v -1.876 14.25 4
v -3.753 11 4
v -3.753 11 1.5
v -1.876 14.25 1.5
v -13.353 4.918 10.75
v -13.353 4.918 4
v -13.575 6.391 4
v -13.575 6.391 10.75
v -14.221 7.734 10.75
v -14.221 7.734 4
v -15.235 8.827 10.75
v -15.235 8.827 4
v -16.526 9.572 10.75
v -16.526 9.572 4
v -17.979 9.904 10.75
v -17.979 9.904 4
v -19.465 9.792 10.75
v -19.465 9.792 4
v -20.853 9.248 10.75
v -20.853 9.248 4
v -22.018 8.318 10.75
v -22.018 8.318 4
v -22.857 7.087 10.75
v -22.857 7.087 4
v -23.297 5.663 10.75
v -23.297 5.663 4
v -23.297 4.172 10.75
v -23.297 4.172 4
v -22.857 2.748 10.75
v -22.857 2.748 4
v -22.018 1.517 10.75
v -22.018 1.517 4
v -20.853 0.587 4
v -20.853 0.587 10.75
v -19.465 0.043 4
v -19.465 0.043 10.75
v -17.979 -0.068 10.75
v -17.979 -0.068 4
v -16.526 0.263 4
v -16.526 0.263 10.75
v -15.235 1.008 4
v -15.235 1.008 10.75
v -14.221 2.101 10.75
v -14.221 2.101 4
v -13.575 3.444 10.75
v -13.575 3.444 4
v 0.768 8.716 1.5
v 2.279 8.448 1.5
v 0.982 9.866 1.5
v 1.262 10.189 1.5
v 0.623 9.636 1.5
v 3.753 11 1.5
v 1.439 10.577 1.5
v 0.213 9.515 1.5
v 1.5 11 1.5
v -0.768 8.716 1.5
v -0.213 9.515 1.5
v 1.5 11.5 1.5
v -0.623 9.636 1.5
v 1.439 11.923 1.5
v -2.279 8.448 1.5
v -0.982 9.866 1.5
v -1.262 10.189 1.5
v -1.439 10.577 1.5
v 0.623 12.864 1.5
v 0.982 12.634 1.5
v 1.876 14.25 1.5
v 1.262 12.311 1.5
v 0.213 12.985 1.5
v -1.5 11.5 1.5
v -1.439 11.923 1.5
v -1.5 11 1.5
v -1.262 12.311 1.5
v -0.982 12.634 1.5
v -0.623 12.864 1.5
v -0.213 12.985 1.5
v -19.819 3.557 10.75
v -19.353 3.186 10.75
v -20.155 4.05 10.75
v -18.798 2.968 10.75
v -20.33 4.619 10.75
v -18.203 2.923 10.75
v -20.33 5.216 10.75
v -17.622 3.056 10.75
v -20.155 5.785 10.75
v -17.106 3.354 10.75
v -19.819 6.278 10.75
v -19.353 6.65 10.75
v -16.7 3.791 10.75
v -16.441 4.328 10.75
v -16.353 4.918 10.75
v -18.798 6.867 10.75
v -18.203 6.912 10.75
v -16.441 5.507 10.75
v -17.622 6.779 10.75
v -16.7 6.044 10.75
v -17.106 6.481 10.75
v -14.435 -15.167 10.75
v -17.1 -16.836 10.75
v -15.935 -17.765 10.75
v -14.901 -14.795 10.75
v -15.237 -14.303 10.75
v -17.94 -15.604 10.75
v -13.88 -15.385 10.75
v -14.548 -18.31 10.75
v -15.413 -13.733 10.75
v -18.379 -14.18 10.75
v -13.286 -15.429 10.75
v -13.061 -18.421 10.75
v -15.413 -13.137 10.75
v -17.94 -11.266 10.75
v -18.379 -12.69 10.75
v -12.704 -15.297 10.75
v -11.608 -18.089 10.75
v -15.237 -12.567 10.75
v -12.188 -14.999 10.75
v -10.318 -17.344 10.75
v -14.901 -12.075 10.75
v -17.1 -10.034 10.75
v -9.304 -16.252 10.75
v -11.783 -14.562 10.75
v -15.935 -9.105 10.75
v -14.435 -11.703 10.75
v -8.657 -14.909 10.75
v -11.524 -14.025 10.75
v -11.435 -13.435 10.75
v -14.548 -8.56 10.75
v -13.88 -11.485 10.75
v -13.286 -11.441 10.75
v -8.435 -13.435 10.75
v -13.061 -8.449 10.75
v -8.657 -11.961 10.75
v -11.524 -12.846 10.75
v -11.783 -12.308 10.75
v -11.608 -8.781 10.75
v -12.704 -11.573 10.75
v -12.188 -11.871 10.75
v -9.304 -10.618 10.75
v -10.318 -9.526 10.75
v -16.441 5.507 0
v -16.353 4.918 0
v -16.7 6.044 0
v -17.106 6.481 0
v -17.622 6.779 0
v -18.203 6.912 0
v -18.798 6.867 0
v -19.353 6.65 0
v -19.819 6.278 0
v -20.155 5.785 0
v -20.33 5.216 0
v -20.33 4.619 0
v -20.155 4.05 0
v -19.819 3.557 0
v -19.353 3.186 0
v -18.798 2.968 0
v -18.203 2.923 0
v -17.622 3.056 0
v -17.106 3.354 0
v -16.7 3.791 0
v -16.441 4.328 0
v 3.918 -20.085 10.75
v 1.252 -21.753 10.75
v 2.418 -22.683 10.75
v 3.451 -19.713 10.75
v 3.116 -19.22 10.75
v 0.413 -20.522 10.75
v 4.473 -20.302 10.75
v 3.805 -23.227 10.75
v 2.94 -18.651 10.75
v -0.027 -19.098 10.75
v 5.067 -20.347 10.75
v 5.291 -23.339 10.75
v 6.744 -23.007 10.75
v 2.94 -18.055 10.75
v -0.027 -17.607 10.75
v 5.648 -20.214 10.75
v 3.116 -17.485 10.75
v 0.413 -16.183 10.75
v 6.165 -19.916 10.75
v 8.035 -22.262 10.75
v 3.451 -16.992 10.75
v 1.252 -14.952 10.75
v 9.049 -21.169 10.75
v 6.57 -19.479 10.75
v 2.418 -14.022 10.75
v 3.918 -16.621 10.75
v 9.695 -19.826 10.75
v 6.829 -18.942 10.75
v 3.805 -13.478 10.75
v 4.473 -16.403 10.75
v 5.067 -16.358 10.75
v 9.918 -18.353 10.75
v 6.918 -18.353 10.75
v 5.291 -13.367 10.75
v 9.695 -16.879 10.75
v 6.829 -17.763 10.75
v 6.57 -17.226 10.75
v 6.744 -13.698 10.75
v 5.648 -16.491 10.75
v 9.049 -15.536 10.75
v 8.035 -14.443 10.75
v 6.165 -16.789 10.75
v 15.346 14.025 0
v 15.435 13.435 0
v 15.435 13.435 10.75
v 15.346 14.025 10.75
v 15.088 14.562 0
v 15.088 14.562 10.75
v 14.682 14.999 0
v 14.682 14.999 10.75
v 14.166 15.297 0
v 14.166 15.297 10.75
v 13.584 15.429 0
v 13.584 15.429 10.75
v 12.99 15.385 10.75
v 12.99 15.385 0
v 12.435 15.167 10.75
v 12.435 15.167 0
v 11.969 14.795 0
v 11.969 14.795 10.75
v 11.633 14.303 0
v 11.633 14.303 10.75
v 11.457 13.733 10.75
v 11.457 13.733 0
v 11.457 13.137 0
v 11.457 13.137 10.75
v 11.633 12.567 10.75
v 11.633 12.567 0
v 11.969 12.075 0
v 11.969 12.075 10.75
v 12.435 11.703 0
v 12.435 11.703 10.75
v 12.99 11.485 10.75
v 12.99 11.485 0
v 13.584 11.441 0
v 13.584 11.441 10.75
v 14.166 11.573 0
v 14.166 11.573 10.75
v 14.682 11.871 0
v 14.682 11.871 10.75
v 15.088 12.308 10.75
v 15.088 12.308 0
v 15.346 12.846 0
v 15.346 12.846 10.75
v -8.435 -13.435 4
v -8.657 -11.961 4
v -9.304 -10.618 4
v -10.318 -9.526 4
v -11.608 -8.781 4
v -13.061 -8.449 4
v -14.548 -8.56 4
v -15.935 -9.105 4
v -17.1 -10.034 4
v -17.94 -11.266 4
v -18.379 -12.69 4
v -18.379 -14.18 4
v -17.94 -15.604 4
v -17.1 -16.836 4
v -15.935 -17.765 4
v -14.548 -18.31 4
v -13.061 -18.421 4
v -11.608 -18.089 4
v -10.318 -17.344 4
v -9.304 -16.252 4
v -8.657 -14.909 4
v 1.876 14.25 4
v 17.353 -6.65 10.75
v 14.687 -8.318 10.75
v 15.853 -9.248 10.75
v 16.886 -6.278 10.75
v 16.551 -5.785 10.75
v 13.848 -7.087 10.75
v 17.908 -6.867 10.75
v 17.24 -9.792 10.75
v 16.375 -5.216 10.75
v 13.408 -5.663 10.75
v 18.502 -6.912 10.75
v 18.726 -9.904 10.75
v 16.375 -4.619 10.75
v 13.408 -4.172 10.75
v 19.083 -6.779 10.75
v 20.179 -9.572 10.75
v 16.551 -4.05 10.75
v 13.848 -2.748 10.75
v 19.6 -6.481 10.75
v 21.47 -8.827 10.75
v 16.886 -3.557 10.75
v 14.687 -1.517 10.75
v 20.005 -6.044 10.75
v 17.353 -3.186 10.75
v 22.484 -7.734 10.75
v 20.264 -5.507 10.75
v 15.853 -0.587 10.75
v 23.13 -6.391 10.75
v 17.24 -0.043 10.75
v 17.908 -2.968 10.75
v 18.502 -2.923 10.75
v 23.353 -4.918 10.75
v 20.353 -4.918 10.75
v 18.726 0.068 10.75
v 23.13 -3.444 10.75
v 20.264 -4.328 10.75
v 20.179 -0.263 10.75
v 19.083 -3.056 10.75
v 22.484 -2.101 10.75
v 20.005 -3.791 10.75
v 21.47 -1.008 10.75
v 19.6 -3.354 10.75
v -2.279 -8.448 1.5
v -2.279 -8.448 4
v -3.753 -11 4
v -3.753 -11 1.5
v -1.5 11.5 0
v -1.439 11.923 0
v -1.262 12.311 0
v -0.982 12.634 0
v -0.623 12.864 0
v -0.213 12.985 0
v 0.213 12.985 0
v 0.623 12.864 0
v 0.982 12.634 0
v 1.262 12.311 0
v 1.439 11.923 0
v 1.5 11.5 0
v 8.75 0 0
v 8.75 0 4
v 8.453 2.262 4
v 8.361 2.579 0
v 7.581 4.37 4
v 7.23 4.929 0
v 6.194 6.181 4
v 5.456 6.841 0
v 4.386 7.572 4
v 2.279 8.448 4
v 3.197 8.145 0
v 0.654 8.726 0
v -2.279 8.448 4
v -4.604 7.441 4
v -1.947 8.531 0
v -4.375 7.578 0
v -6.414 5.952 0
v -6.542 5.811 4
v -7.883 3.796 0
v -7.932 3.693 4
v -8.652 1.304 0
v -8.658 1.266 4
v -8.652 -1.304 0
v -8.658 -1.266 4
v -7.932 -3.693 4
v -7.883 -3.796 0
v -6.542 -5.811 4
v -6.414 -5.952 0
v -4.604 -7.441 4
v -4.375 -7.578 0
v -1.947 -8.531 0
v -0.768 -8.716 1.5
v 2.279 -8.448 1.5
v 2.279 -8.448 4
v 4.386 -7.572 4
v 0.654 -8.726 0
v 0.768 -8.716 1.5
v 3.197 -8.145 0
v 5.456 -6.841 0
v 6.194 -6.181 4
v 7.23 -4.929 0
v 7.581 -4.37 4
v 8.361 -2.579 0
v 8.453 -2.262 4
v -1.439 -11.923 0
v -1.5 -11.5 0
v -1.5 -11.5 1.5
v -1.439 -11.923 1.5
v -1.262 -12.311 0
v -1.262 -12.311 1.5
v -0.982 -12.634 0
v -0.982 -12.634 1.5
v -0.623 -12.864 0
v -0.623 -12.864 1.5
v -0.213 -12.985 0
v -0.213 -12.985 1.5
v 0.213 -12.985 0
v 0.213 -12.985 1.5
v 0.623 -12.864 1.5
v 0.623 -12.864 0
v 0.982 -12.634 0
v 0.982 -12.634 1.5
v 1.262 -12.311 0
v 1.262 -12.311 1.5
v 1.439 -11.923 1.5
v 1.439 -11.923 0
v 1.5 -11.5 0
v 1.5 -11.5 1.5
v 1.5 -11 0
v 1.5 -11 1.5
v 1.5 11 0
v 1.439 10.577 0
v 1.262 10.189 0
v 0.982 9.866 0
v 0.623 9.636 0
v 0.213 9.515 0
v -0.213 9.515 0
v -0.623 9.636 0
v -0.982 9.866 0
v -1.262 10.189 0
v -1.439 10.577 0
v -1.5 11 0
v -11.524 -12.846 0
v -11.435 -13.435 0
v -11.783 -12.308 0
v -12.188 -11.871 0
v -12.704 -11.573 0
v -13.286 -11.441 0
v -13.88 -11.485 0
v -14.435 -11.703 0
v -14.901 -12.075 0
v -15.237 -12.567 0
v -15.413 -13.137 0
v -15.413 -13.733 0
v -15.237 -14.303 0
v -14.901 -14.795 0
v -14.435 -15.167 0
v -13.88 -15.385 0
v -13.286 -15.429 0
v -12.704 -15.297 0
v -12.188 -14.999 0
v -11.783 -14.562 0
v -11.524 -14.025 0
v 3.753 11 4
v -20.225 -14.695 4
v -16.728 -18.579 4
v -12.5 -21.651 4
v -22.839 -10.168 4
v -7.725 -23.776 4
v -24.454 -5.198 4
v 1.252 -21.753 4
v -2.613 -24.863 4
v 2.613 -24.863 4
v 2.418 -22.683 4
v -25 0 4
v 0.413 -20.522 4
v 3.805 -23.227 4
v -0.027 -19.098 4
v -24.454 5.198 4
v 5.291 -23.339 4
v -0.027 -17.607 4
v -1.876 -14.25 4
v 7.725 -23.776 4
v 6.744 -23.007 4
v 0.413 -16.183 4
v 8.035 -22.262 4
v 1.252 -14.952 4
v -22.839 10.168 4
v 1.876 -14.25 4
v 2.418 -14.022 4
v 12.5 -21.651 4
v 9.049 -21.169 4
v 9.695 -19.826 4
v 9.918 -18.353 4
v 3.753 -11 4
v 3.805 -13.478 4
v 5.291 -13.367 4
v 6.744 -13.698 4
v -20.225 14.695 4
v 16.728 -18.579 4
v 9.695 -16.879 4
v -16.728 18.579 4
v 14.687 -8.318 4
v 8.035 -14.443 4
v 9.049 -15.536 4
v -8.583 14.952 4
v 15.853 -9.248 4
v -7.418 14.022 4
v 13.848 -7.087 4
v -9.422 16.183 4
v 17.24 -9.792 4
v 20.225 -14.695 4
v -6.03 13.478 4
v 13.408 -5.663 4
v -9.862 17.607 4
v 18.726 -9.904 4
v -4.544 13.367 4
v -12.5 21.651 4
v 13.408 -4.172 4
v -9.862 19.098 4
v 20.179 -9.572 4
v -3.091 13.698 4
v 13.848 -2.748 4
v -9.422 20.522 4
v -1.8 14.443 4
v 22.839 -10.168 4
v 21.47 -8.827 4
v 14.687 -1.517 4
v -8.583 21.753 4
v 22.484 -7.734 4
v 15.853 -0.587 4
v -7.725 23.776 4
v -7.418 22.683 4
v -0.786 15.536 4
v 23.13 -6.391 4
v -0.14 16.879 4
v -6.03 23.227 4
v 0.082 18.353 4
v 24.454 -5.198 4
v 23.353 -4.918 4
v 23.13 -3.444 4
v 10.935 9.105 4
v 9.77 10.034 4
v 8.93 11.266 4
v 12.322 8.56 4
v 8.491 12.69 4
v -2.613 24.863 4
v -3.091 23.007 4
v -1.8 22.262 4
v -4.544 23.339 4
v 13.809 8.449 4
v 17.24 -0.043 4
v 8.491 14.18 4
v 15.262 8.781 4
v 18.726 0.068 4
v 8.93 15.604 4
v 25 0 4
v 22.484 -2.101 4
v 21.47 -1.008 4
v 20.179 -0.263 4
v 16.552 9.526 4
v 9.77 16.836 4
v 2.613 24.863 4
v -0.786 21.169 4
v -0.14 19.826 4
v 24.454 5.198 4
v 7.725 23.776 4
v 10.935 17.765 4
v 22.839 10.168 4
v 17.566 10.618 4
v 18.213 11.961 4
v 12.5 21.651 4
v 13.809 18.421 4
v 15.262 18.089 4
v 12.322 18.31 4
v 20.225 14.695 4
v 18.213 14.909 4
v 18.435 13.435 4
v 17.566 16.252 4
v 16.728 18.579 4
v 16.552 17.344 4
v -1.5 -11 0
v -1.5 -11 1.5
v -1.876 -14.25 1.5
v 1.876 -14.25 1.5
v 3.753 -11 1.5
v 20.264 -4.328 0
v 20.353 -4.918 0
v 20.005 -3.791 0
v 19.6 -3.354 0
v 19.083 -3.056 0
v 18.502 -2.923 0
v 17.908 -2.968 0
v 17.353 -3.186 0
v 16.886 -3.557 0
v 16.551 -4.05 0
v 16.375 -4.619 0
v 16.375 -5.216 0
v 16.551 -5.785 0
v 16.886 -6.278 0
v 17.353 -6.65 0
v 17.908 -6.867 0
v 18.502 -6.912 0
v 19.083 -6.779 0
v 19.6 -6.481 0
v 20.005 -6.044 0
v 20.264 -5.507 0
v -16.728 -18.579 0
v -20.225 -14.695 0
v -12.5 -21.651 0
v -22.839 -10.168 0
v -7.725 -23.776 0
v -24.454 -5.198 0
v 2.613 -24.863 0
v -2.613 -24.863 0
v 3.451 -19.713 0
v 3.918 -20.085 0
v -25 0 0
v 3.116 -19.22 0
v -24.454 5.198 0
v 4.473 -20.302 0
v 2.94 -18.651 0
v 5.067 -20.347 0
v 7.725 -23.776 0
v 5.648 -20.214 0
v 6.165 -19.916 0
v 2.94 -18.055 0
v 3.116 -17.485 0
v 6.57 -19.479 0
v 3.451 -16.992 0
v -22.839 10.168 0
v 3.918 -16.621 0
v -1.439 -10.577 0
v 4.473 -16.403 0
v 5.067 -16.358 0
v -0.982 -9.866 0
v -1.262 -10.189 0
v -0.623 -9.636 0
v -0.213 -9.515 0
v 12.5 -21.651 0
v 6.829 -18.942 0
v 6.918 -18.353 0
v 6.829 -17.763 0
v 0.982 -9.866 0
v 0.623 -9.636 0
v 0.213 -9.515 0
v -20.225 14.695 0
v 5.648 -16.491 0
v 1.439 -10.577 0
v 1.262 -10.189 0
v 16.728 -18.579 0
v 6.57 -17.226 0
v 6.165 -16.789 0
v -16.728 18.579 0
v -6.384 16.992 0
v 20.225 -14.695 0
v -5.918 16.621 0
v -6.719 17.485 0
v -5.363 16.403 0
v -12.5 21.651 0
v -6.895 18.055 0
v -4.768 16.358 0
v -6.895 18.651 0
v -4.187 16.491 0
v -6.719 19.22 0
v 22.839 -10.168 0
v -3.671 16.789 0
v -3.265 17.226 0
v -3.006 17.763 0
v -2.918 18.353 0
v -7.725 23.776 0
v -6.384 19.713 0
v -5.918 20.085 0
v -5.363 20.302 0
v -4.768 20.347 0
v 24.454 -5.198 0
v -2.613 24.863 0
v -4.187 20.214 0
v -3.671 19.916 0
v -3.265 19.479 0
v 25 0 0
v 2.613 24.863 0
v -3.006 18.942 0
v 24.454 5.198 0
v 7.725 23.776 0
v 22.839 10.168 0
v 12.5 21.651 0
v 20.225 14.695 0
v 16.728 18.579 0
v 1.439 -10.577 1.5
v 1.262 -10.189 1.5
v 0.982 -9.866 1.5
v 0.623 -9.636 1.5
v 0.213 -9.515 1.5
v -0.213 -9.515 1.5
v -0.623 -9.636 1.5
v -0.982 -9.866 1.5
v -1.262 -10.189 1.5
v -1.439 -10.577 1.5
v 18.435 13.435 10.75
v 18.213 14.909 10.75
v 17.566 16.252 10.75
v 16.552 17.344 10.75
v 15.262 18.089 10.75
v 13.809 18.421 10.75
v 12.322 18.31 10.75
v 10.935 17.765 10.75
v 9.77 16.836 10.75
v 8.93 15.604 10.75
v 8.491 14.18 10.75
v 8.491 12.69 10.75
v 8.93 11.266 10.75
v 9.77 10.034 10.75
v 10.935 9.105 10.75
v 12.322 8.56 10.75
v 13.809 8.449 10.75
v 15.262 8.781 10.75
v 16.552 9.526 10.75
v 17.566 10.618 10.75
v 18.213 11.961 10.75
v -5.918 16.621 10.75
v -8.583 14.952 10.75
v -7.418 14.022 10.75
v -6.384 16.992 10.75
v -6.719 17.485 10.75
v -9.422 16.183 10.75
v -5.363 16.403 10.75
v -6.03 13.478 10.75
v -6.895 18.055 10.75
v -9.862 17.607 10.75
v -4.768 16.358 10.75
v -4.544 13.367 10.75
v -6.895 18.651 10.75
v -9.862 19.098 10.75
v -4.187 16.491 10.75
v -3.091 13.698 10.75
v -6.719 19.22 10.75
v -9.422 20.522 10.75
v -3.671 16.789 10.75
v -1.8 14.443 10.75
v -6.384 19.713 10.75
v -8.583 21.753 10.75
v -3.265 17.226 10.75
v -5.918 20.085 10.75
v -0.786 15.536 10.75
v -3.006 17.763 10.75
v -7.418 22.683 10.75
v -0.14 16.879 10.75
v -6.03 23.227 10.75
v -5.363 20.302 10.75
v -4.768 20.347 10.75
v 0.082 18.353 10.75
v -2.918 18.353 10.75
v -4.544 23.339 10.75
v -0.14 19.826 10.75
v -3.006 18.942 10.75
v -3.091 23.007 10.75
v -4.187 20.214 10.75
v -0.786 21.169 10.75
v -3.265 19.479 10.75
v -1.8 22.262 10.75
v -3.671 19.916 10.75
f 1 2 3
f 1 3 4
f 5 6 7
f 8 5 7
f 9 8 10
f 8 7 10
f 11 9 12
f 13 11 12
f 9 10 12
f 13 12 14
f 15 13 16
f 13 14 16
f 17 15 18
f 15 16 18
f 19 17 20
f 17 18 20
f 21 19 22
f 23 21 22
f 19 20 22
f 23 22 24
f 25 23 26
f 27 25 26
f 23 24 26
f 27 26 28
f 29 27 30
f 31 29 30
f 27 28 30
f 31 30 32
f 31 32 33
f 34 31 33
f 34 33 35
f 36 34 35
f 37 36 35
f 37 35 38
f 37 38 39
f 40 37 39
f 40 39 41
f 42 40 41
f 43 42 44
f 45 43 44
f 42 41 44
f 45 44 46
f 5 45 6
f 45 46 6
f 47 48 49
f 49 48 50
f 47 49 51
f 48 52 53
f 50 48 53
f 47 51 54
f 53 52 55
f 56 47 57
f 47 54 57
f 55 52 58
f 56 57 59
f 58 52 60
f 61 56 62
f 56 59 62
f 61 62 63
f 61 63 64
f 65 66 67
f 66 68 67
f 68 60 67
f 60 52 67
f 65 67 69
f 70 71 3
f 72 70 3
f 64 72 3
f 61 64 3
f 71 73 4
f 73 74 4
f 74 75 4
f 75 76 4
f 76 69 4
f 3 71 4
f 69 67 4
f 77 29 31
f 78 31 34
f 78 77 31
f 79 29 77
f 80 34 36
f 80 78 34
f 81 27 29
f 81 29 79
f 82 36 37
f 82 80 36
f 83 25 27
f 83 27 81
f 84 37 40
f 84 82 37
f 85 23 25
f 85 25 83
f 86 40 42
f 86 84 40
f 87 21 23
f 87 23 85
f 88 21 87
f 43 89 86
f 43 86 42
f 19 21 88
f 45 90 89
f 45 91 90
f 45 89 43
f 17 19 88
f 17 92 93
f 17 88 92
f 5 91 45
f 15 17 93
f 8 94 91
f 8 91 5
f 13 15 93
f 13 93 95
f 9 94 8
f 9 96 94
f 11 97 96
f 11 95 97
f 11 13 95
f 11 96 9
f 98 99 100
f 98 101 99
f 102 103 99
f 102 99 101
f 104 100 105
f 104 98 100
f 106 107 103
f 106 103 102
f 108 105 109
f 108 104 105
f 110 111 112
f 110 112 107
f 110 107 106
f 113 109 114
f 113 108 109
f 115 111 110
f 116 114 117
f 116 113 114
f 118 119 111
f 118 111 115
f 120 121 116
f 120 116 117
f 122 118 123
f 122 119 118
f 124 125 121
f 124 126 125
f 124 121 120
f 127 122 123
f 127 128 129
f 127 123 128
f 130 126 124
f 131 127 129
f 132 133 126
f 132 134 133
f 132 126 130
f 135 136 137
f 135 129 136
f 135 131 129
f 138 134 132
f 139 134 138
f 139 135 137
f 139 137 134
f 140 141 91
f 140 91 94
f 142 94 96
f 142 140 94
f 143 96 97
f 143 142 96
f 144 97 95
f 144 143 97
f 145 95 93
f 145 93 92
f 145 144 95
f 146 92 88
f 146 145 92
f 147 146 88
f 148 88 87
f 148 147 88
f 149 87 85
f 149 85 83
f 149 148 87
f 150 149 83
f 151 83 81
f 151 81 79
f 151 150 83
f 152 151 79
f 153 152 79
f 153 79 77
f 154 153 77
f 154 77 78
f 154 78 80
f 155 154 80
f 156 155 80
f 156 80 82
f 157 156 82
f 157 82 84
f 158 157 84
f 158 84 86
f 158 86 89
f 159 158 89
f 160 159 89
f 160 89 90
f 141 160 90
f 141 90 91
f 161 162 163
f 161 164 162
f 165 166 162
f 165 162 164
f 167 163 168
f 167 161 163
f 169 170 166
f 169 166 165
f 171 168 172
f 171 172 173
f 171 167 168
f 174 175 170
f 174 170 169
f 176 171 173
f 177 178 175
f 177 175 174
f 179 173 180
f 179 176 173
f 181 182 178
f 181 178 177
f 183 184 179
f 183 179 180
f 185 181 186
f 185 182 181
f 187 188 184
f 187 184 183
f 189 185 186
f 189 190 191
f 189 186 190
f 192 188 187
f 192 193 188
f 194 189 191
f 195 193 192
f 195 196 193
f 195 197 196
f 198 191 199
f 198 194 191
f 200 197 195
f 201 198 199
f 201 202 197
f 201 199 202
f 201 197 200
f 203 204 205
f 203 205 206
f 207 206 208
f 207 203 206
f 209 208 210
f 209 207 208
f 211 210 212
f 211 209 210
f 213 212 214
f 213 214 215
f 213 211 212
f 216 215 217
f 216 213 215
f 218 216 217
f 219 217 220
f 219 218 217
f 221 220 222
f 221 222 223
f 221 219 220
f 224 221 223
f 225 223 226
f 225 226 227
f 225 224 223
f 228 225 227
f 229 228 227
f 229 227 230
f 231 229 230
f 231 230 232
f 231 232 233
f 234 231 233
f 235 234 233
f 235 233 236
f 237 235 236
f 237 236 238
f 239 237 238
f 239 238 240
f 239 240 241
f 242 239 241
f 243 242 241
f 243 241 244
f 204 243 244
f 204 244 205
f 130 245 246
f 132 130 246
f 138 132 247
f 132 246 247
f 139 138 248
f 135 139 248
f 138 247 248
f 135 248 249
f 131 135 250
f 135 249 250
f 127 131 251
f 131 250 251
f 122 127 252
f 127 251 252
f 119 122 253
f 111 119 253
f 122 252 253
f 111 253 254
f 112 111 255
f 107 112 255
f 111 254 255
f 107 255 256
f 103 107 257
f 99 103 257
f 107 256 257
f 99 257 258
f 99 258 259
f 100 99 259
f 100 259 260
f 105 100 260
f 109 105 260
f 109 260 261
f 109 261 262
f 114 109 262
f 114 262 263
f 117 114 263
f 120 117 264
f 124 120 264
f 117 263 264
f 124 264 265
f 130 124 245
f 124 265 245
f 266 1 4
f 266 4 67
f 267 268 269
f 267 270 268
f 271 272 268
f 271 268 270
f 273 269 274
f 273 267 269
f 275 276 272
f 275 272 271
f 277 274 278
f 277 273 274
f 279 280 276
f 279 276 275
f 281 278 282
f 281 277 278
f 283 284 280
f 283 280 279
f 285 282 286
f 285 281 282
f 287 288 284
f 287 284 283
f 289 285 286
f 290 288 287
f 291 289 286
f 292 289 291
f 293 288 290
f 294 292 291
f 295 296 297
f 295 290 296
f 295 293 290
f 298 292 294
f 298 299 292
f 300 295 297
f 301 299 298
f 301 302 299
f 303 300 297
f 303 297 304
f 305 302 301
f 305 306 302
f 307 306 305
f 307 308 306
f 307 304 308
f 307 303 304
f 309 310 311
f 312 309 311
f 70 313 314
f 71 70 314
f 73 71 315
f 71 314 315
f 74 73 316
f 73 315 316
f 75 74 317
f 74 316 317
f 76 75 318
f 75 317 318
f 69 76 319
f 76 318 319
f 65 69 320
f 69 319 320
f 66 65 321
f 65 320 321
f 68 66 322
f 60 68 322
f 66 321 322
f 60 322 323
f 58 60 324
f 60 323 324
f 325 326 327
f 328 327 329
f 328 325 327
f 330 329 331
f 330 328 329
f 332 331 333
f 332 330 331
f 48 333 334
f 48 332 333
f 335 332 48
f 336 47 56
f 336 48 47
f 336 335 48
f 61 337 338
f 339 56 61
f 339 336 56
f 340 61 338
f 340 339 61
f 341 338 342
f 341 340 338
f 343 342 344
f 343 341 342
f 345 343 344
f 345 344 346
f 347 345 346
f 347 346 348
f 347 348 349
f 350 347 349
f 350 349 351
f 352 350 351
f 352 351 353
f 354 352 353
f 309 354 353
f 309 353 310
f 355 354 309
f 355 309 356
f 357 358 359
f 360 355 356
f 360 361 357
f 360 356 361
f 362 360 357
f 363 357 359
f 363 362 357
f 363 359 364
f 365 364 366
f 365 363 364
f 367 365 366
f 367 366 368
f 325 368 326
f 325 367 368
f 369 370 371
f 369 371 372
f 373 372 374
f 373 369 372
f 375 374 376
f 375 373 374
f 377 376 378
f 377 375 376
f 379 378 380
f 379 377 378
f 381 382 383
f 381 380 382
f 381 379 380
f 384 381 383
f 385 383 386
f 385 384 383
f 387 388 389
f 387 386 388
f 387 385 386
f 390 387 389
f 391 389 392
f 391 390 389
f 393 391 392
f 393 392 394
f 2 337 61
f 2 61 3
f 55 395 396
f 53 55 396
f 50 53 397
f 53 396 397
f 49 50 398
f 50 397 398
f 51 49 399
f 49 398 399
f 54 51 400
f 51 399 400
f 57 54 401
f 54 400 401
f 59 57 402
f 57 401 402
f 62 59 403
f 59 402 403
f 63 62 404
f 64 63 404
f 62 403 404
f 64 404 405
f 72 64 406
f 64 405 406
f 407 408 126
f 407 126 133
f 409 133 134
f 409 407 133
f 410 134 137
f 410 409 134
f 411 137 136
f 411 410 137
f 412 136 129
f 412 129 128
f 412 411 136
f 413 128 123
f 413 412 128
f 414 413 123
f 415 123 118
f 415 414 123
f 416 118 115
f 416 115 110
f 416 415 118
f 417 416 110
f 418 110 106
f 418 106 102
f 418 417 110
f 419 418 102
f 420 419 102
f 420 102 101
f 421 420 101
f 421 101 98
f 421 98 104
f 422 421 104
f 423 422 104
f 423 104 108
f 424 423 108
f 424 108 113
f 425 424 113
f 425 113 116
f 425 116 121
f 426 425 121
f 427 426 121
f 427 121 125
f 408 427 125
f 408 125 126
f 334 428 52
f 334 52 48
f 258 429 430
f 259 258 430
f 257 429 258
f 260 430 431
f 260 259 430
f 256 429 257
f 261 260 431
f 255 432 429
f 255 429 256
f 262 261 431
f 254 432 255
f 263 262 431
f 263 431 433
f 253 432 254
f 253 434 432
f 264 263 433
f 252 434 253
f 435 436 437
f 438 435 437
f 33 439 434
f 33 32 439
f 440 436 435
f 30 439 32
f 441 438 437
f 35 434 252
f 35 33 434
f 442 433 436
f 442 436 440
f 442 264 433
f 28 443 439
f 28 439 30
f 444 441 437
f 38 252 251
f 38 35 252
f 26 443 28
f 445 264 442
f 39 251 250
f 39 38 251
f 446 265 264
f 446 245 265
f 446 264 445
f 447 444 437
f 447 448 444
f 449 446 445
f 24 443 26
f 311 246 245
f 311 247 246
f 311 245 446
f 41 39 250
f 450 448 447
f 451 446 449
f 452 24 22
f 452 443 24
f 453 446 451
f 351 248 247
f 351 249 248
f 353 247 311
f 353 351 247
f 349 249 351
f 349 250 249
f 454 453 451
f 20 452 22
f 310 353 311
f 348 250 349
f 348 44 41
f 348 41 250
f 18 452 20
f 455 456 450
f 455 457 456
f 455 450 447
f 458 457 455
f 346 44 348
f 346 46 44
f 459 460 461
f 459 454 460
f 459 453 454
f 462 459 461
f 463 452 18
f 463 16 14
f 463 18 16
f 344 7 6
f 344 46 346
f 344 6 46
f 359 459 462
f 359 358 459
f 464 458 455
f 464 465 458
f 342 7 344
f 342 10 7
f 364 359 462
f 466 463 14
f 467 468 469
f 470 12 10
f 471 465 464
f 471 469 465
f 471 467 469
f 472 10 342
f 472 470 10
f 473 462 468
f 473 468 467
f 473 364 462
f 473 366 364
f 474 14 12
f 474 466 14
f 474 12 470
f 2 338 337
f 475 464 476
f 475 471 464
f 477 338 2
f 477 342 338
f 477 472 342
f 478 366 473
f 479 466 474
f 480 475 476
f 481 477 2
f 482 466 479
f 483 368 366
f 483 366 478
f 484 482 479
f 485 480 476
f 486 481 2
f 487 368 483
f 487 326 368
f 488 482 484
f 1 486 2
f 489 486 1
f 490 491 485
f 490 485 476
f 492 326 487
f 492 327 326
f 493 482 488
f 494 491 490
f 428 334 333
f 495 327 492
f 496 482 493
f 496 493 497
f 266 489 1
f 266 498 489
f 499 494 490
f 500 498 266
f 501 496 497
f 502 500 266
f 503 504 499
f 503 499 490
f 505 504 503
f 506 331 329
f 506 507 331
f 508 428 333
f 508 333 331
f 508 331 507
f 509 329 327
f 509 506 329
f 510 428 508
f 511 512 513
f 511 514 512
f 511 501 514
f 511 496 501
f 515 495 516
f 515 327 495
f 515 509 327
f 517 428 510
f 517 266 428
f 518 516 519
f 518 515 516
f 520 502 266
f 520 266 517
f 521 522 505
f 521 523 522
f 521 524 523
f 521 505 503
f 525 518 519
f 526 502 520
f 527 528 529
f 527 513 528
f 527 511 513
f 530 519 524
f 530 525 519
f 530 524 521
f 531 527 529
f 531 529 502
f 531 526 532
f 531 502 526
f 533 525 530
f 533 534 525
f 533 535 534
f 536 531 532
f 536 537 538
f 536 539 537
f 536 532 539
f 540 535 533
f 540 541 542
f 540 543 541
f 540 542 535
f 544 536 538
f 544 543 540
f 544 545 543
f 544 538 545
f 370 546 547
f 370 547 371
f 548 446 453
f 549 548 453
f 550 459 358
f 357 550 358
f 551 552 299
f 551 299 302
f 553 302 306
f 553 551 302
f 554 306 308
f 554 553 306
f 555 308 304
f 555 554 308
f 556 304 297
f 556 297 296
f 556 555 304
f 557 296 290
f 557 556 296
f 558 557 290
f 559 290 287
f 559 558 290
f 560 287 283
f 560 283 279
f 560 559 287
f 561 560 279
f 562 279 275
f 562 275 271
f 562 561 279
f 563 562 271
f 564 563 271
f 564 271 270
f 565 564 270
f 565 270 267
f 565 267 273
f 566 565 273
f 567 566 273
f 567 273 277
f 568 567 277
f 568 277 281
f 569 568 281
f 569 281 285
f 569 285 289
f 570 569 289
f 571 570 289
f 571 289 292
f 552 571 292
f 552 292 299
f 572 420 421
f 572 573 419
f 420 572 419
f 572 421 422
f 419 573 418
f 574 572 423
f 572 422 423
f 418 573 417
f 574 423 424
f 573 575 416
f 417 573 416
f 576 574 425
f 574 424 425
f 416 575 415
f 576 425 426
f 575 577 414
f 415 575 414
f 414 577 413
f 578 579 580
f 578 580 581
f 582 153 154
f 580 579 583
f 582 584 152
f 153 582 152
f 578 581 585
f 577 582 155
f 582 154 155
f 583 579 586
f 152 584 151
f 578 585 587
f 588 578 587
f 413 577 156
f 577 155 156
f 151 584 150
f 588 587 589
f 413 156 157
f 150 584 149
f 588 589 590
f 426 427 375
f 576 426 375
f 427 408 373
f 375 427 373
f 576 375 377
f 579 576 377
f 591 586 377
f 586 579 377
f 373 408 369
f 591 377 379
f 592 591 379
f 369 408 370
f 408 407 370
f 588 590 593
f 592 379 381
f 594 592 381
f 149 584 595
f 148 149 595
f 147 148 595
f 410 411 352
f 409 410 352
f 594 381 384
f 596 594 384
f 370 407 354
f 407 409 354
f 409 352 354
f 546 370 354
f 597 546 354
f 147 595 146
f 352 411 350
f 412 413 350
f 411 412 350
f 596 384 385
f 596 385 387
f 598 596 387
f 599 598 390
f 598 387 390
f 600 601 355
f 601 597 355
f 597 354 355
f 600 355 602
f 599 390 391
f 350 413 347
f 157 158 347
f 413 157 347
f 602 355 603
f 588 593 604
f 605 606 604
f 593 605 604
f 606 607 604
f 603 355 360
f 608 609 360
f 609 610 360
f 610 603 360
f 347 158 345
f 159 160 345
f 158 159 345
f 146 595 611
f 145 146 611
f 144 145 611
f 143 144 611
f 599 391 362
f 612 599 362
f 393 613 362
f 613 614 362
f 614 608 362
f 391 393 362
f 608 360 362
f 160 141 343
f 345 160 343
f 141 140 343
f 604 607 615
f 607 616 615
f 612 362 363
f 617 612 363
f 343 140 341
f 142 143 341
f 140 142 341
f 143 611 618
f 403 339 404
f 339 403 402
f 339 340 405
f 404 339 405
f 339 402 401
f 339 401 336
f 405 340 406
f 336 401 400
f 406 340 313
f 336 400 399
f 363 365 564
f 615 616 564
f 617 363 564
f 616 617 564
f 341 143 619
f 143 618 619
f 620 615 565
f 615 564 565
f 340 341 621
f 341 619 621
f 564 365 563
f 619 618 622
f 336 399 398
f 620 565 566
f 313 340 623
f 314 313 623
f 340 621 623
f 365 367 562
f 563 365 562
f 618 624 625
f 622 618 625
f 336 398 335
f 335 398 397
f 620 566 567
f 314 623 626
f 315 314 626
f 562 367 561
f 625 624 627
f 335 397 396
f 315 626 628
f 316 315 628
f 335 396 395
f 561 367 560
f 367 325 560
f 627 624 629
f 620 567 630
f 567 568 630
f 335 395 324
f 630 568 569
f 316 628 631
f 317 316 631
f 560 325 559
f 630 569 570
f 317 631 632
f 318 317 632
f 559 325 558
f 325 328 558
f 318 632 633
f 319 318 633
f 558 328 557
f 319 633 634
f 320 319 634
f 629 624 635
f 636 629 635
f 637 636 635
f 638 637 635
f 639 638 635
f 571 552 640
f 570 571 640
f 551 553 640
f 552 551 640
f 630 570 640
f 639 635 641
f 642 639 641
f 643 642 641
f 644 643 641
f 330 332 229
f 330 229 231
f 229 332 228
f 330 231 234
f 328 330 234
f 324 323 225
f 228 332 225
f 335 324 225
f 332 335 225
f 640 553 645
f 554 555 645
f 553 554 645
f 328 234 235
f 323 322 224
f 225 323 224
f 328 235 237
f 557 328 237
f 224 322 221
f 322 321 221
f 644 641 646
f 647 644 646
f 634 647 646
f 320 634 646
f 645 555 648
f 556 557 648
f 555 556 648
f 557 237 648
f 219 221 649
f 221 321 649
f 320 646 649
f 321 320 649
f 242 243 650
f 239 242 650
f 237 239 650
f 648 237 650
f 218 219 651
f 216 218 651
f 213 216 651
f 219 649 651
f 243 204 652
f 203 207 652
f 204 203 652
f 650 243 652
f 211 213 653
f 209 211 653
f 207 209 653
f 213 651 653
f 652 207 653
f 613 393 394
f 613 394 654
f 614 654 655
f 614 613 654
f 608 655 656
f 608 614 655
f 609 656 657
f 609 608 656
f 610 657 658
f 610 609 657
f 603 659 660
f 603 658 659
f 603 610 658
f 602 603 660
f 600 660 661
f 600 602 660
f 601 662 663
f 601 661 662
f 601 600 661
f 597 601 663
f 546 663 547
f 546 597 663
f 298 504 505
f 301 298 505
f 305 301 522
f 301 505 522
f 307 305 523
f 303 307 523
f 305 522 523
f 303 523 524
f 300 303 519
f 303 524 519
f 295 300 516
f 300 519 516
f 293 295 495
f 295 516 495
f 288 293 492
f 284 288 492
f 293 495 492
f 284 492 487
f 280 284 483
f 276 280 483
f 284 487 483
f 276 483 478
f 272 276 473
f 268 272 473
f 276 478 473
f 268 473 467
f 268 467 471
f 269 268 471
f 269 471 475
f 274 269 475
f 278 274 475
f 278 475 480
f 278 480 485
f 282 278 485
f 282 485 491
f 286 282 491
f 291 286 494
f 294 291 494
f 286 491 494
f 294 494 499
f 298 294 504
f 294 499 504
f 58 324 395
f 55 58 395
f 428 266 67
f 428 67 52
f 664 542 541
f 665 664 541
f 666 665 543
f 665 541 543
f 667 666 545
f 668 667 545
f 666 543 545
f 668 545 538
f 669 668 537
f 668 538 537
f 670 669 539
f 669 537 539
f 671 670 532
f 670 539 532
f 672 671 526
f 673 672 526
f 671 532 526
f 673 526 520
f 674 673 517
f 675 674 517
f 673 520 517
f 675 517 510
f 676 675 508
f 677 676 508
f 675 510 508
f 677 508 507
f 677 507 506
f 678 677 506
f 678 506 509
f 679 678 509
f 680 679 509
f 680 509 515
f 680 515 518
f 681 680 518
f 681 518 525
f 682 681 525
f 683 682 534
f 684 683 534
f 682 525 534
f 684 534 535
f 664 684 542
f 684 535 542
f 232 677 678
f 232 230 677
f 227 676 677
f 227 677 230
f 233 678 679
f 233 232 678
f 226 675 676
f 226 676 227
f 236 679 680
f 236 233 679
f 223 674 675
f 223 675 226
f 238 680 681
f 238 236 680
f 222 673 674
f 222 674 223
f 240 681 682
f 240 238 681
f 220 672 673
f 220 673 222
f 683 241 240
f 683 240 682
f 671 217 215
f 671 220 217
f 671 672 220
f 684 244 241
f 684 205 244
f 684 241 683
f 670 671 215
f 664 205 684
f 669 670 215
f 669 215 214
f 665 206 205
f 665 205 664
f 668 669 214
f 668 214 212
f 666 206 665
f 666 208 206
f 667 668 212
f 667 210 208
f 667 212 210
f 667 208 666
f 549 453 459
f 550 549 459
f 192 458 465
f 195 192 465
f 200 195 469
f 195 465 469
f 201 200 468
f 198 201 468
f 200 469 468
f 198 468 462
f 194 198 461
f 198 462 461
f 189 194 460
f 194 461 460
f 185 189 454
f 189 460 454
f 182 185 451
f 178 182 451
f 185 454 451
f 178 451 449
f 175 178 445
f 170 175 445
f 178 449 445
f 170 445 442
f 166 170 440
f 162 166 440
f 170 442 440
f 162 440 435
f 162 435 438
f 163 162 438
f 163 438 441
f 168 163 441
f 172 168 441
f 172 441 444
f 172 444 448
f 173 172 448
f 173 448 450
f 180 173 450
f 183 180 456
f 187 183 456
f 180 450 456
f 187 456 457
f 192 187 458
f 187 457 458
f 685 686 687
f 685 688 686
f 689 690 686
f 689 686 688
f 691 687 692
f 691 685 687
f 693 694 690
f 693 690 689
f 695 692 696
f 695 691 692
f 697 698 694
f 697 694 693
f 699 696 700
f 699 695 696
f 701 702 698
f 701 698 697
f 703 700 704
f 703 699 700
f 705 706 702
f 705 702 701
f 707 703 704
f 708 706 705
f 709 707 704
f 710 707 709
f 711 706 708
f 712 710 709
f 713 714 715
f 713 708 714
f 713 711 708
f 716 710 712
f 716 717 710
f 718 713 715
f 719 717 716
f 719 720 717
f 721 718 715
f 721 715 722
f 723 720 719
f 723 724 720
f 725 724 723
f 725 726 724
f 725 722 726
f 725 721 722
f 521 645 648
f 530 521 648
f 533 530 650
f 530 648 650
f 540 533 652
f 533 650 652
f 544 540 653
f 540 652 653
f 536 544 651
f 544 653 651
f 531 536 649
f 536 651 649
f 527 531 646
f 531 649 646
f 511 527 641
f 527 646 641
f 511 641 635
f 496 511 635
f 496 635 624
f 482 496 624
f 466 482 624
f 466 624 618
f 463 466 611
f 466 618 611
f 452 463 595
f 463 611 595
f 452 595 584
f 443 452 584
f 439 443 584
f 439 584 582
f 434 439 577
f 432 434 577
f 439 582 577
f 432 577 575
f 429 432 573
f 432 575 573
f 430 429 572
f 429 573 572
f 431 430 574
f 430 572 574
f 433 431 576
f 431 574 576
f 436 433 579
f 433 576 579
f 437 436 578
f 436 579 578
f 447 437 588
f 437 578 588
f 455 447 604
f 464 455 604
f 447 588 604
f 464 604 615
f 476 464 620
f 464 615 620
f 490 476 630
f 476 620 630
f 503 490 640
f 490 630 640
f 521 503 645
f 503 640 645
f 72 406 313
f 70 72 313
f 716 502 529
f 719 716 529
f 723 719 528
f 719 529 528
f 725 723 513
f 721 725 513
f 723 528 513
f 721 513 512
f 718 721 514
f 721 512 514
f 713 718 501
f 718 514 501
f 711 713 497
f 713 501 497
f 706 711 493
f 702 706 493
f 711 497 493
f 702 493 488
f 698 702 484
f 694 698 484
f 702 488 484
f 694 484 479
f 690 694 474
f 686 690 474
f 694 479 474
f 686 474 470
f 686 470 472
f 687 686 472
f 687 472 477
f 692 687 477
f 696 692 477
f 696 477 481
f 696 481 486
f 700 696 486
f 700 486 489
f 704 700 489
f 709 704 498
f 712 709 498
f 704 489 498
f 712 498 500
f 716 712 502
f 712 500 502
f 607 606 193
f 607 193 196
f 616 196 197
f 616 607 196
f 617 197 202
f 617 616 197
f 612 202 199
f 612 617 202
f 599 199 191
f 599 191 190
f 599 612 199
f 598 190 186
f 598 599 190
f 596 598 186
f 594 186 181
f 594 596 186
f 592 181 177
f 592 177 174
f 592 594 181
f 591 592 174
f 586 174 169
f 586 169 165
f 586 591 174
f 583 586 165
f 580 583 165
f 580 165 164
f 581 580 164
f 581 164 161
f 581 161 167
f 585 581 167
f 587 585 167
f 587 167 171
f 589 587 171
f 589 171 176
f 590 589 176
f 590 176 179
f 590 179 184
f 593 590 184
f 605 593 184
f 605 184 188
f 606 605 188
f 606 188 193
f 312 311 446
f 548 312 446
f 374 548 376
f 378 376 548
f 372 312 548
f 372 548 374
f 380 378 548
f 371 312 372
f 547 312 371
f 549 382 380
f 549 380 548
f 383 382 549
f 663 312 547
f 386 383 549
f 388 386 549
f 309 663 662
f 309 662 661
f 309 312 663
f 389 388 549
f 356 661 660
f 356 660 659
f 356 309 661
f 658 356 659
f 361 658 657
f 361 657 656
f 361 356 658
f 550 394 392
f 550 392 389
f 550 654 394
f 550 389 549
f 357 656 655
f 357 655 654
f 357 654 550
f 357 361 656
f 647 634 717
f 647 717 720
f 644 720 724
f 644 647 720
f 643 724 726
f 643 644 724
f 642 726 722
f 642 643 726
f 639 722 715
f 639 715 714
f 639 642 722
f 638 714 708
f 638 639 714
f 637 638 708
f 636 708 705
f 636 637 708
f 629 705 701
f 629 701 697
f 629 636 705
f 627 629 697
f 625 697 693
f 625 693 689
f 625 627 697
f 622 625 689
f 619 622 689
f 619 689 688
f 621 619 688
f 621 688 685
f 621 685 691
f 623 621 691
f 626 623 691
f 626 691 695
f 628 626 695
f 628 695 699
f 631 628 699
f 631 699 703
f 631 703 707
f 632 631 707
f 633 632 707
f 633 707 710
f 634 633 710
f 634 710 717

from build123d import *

# Parameters (mm, degrees)
SKETCH1_R           = 25
SKETCH1_R_2         = 8.75
BOSS_EXTRUDE1_DEPTH = 4
SKETCH2_R           = 5
SKETCH2_R_2         = 2
BOSS_EXTRUDE2_DEPTH = 6.75
CUT_EXTRUDE1_START  = -6.75
SKETCH5_R           = 2
CUT_EXTRUDE1_DEPTH  = 6.75
CUT_EXTRUDE2_DEPTH  = 2.5


with BuildPart() as part:
    # Sketch1 → Boss-Extrude1 (new body)
    with BuildSketch(Plane.XY):
        Circle(SKETCH1_R)
        Circle(SKETCH1_R_2, mode=Mode.SUBTRACT)
        with BuildLine():
            Line((-1.5, 11), (-1.5, 11.5))
            ThreePointArc((-1.5, 11.5), (0, 13), (1.5, 11.5))
            Line((1.5, 11.5), (1.5, 11))
            ThreePointArc((1.5, 11), (0, 9.5), (-1.5, 11))
        make_face(mode=Mode.SUBTRACT)
        with BuildLine():
            Line((-1.5, -11), (-1.5, -11.5))
            ThreePointArc((-1.5, -11.5), (0, -13), (1.5, -11.5))
            Line((1.5, -11.5), (1.5, -11))
            ThreePointArc((1.5, -11), (0, -9.5), (-1.5, -11))
        make_face(mode=Mode.SUBTRACT)
    extrude(amount=BOSS_EXTRUDE1_DEPTH)

    # Sketch2 → Boss-Extrude2 (add)
    # profile 1 of 6: a face of its own
    with BuildSketch(Plane.XY.offset(4)):
        with Locations((-4.917561857, 18.352590699)):
            Circle(SKETCH2_R)
        with Locations((-4.917561857, 18.352590699)):
            Circle(SKETCH2_R_2, mode=Mode.SUBTRACT)
    # profile 2 of 6: a face of its own
    with BuildSketch(Plane.XY.offset(4)):
        with Locations((-18.352590699, 4.917561857)):
            Circle(SKETCH2_R)
        with Locations((-18.352590699, 4.917561857)):
            Circle(SKETCH2_R_2, mode=Mode.SUBTRACT)
    # profile 3 of 6: a face of its own
    with BuildSketch(Plane.XY.offset(4)):
        with Locations((-13.435028843, -13.435028843)):
            Circle(SKETCH2_R)
        with Locations((-13.435028843, -13.435028843)):
            Circle(SKETCH2_R_2, mode=Mode.SUBTRACT)
    # profile 4 of 6: a face of its own
    with BuildSketch(Plane.XY.offset(4)):
        with Locations((4.917561857, -18.352590699)):
            Circle(SKETCH2_R)
        with Locations((4.917561857, -18.352590699)):
            Circle(SKETCH2_R_2, mode=Mode.SUBTRACT)
    # profile 5 of 6: a face of its own
    with BuildSketch(Plane.XY.offset(4)):
        with Locations((18.352590699, -4.917561857)):
            Circle(SKETCH2_R)
        with Locations((18.352590699, -4.917561857)):
            Circle(SKETCH2_R_2, mode=Mode.SUBTRACT)
    # profile 6 of 6: a face of its own
    with BuildSketch(Plane.XY.offset(4)):
        with Locations((13.435028843, 13.435028843)):
            Circle(SKETCH2_R)
        with Locations((13.435028843, 13.435028843)):
            Circle(SKETCH2_R_2, mode=Mode.SUBTRACT)
    extrude(amount=BOSS_EXTRUDE2_DEPTH)

    # Sketch5 → Cut-Extrude1 (cut)
    with BuildSketch(Plane.XY.offset(4).offset(CUT_EXTRUDE1_START)):
        with Locations((-18.352590699, 4.917561857)):
            Circle(SKETCH5_R)
        with Locations((-13.435028843, -13.435028843)):
            Circle(SKETCH5_R)
        with Locations((4.917561857, -18.352590699)):
            Circle(SKETCH5_R)
        with Locations((18.352590699, -4.917561857)):
            Circle(SKETCH5_R)
        with Locations((13.435028843, 13.435028843)):
            Circle(SKETCH5_R)
        with Locations((-4.917561857, 18.352590699)):
            Circle(SKETCH5_R)
    extrude(amount=CUT_EXTRUDE1_DEPTH, mode=Mode.SUBTRACT)

    # Sketch6 → Cut-Extrude2 (cut)
    with BuildSketch(Plane.XY.offset(4)):
        Polygon((1.876388375, -7.75), (-1.876388375, -7.75), (-3.75277675, -11), (-1.876388375, -14.25), (1.876388375, -14.25), (3.75277675, -11), align=None)
        Polygon((1.876388375, 14.25), (3.75277675, 11), (1.876388375, 7.75), (-1.876388375, 7.75), (-3.75277675, 11), (-1.876388375, 14.25), align=None)
    extrude(amount=-CUT_EXTRUDE2_DEPTH, mode=Mode.SUBTRACT)


solid = part.part
